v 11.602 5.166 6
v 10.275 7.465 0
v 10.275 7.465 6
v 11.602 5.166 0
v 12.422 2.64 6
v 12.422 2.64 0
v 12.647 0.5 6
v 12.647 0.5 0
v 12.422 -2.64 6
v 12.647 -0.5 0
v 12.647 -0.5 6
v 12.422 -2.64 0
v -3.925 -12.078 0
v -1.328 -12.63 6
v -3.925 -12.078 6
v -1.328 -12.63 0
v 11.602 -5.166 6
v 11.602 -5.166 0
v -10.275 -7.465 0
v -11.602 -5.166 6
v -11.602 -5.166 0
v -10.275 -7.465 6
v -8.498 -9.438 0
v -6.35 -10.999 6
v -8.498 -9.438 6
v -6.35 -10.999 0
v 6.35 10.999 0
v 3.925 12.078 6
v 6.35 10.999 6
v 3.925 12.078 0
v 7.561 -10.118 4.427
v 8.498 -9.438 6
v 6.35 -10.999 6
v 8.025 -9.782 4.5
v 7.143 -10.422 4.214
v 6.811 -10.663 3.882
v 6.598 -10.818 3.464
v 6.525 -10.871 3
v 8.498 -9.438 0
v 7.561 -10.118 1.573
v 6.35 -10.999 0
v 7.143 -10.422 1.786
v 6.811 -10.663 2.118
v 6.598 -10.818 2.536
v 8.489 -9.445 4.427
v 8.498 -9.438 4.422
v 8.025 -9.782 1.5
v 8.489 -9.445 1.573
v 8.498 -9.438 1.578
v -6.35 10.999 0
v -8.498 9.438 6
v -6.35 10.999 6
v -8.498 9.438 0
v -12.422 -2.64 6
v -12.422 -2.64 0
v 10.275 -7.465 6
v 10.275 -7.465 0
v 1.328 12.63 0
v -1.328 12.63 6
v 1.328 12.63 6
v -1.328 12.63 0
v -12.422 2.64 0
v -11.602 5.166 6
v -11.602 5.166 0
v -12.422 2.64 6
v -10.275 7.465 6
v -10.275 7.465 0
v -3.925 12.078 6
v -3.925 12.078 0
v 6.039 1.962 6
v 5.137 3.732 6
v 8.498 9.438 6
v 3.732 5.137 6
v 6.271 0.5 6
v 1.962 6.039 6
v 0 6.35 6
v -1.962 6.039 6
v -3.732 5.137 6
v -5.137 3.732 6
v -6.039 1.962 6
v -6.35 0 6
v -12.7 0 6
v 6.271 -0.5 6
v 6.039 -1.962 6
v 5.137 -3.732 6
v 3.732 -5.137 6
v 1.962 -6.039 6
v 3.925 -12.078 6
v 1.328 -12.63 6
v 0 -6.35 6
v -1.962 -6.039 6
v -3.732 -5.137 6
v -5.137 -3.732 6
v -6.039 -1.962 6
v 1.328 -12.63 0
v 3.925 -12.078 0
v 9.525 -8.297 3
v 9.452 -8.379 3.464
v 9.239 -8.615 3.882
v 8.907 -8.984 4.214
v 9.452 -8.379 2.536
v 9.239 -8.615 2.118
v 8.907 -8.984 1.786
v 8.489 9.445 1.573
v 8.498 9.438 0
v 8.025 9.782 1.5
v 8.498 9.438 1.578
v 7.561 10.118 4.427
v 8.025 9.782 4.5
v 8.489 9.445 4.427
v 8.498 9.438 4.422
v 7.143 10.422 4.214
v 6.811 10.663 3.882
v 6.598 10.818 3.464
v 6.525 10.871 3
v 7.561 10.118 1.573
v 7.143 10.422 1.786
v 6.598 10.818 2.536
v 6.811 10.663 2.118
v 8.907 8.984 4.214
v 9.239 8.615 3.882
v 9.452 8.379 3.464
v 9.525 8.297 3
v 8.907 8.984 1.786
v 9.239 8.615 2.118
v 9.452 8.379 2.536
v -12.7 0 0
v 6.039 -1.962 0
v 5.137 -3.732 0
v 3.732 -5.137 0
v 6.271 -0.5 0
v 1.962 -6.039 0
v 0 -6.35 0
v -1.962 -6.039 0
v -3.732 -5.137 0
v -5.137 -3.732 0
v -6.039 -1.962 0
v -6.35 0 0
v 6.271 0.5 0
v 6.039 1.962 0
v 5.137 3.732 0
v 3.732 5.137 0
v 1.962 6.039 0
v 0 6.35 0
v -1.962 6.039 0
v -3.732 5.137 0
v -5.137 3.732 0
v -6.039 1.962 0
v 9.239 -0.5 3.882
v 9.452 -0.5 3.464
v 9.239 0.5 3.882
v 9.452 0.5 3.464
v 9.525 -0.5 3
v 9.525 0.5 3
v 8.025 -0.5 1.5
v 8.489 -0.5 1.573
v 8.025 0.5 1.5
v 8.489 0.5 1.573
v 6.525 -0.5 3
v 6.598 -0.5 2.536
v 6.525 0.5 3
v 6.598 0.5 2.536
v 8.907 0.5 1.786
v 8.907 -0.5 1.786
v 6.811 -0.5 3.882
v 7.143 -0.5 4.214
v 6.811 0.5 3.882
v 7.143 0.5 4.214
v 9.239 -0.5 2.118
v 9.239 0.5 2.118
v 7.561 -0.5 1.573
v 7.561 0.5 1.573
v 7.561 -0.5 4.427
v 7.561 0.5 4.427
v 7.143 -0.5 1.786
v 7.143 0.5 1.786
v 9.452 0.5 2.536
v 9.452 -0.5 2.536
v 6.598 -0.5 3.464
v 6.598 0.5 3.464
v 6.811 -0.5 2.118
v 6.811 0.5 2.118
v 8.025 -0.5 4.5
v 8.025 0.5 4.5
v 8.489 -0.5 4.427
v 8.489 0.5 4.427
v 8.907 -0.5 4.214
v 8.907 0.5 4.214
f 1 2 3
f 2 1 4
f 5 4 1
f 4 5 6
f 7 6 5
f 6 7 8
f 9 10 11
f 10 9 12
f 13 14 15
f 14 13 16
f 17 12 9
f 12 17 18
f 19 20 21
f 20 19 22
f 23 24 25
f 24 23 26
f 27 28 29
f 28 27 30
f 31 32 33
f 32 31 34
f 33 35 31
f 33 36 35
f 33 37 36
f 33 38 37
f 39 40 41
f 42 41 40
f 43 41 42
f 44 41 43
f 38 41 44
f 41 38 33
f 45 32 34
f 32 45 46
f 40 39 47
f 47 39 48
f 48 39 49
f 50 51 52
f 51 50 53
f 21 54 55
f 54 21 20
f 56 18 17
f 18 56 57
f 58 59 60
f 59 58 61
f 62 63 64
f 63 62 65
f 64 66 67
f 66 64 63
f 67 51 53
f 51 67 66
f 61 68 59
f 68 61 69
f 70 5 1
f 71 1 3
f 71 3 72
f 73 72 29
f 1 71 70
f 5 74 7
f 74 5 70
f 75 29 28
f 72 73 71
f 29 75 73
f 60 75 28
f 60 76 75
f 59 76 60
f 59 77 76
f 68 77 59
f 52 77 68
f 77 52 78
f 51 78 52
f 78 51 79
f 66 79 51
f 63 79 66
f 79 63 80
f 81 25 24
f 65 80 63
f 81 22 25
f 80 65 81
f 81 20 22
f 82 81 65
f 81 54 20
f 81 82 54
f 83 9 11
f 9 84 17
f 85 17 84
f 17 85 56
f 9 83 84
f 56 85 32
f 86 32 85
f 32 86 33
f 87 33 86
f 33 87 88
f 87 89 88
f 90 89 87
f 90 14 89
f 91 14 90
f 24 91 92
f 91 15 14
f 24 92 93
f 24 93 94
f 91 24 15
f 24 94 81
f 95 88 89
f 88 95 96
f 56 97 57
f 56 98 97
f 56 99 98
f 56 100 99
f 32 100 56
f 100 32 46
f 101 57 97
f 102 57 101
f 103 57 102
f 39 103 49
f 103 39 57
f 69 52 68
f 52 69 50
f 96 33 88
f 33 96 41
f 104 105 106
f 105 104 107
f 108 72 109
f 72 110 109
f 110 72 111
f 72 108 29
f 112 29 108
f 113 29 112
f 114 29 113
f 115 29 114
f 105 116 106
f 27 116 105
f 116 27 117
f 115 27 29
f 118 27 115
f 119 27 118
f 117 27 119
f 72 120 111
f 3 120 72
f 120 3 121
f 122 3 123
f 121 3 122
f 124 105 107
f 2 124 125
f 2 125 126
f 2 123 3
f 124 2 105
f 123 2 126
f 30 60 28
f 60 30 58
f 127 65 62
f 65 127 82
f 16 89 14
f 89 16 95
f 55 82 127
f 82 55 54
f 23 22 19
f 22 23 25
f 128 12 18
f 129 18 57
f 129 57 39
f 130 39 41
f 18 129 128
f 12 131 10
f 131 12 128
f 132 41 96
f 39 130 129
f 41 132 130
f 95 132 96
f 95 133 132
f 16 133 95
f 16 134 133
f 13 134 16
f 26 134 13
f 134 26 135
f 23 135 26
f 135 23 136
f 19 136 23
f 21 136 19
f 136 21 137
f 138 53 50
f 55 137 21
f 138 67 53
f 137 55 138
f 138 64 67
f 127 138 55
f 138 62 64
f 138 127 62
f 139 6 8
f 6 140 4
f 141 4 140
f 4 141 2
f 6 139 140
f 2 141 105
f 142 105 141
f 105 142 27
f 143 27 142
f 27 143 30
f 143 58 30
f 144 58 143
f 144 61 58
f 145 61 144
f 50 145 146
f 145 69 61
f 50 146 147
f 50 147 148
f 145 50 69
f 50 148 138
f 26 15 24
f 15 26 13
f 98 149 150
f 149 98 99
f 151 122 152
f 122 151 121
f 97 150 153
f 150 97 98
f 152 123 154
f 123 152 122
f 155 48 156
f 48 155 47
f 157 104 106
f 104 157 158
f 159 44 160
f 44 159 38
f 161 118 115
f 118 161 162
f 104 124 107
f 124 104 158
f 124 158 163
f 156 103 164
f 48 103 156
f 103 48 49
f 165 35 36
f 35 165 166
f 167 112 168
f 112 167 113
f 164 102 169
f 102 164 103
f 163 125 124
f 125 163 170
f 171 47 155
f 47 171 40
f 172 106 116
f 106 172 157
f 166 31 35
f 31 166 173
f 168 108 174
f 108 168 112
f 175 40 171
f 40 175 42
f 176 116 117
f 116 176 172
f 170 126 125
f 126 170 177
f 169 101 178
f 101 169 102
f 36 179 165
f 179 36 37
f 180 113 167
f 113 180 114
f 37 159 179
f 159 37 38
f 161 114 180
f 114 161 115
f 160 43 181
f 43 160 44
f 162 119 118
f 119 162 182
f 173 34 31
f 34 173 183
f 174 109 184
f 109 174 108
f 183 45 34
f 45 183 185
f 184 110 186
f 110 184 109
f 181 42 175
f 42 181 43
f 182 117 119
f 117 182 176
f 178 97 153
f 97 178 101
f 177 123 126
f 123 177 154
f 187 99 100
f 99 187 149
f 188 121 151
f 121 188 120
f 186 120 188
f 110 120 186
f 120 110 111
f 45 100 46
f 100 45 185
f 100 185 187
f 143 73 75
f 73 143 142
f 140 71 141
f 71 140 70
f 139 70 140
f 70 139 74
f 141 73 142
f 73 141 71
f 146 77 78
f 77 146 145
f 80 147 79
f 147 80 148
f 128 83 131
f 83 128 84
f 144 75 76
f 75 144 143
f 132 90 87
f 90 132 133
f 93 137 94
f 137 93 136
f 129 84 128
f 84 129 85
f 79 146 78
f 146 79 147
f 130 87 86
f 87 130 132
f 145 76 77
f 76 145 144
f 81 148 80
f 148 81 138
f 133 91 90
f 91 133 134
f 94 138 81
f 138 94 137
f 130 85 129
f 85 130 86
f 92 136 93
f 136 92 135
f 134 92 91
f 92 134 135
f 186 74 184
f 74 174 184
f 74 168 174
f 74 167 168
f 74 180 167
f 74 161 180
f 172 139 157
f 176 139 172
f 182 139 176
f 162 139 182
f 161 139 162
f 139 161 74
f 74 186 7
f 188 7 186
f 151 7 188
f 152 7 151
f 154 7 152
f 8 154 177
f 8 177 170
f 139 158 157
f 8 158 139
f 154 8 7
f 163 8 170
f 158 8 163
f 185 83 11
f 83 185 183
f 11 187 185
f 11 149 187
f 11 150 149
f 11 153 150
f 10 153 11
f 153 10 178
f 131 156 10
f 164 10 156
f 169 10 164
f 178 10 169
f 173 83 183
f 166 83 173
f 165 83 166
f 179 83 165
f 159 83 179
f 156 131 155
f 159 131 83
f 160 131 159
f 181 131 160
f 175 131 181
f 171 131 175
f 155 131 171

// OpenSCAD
use <MCAD/nuts_and_bolts.scad>;

in=25.4;
shaft = .5*in;
screw = 3;
head = 5;
width = screw*2;
collar = shaft + max(.5*in, screw+4);
slot = 1;

difference() {
	cylinder(d=collar, h=width);
	translate([shaft/2+(collar-shaft)/4-screw/2, -screw/2, width/2]) rotate([90, 0, 0]) cylinder(d=screw, h=collar, center=true,$fn=20);
	cylinder(d=shaft, h=width);
	translate([0, -slot/2, 0]) cube([collar/2, slot, width]);
}

//screw("m5", 10, -1, false, -1);

//module boltHole(size, units=MM, length, tolerance = +0.0001, proj = -1)
